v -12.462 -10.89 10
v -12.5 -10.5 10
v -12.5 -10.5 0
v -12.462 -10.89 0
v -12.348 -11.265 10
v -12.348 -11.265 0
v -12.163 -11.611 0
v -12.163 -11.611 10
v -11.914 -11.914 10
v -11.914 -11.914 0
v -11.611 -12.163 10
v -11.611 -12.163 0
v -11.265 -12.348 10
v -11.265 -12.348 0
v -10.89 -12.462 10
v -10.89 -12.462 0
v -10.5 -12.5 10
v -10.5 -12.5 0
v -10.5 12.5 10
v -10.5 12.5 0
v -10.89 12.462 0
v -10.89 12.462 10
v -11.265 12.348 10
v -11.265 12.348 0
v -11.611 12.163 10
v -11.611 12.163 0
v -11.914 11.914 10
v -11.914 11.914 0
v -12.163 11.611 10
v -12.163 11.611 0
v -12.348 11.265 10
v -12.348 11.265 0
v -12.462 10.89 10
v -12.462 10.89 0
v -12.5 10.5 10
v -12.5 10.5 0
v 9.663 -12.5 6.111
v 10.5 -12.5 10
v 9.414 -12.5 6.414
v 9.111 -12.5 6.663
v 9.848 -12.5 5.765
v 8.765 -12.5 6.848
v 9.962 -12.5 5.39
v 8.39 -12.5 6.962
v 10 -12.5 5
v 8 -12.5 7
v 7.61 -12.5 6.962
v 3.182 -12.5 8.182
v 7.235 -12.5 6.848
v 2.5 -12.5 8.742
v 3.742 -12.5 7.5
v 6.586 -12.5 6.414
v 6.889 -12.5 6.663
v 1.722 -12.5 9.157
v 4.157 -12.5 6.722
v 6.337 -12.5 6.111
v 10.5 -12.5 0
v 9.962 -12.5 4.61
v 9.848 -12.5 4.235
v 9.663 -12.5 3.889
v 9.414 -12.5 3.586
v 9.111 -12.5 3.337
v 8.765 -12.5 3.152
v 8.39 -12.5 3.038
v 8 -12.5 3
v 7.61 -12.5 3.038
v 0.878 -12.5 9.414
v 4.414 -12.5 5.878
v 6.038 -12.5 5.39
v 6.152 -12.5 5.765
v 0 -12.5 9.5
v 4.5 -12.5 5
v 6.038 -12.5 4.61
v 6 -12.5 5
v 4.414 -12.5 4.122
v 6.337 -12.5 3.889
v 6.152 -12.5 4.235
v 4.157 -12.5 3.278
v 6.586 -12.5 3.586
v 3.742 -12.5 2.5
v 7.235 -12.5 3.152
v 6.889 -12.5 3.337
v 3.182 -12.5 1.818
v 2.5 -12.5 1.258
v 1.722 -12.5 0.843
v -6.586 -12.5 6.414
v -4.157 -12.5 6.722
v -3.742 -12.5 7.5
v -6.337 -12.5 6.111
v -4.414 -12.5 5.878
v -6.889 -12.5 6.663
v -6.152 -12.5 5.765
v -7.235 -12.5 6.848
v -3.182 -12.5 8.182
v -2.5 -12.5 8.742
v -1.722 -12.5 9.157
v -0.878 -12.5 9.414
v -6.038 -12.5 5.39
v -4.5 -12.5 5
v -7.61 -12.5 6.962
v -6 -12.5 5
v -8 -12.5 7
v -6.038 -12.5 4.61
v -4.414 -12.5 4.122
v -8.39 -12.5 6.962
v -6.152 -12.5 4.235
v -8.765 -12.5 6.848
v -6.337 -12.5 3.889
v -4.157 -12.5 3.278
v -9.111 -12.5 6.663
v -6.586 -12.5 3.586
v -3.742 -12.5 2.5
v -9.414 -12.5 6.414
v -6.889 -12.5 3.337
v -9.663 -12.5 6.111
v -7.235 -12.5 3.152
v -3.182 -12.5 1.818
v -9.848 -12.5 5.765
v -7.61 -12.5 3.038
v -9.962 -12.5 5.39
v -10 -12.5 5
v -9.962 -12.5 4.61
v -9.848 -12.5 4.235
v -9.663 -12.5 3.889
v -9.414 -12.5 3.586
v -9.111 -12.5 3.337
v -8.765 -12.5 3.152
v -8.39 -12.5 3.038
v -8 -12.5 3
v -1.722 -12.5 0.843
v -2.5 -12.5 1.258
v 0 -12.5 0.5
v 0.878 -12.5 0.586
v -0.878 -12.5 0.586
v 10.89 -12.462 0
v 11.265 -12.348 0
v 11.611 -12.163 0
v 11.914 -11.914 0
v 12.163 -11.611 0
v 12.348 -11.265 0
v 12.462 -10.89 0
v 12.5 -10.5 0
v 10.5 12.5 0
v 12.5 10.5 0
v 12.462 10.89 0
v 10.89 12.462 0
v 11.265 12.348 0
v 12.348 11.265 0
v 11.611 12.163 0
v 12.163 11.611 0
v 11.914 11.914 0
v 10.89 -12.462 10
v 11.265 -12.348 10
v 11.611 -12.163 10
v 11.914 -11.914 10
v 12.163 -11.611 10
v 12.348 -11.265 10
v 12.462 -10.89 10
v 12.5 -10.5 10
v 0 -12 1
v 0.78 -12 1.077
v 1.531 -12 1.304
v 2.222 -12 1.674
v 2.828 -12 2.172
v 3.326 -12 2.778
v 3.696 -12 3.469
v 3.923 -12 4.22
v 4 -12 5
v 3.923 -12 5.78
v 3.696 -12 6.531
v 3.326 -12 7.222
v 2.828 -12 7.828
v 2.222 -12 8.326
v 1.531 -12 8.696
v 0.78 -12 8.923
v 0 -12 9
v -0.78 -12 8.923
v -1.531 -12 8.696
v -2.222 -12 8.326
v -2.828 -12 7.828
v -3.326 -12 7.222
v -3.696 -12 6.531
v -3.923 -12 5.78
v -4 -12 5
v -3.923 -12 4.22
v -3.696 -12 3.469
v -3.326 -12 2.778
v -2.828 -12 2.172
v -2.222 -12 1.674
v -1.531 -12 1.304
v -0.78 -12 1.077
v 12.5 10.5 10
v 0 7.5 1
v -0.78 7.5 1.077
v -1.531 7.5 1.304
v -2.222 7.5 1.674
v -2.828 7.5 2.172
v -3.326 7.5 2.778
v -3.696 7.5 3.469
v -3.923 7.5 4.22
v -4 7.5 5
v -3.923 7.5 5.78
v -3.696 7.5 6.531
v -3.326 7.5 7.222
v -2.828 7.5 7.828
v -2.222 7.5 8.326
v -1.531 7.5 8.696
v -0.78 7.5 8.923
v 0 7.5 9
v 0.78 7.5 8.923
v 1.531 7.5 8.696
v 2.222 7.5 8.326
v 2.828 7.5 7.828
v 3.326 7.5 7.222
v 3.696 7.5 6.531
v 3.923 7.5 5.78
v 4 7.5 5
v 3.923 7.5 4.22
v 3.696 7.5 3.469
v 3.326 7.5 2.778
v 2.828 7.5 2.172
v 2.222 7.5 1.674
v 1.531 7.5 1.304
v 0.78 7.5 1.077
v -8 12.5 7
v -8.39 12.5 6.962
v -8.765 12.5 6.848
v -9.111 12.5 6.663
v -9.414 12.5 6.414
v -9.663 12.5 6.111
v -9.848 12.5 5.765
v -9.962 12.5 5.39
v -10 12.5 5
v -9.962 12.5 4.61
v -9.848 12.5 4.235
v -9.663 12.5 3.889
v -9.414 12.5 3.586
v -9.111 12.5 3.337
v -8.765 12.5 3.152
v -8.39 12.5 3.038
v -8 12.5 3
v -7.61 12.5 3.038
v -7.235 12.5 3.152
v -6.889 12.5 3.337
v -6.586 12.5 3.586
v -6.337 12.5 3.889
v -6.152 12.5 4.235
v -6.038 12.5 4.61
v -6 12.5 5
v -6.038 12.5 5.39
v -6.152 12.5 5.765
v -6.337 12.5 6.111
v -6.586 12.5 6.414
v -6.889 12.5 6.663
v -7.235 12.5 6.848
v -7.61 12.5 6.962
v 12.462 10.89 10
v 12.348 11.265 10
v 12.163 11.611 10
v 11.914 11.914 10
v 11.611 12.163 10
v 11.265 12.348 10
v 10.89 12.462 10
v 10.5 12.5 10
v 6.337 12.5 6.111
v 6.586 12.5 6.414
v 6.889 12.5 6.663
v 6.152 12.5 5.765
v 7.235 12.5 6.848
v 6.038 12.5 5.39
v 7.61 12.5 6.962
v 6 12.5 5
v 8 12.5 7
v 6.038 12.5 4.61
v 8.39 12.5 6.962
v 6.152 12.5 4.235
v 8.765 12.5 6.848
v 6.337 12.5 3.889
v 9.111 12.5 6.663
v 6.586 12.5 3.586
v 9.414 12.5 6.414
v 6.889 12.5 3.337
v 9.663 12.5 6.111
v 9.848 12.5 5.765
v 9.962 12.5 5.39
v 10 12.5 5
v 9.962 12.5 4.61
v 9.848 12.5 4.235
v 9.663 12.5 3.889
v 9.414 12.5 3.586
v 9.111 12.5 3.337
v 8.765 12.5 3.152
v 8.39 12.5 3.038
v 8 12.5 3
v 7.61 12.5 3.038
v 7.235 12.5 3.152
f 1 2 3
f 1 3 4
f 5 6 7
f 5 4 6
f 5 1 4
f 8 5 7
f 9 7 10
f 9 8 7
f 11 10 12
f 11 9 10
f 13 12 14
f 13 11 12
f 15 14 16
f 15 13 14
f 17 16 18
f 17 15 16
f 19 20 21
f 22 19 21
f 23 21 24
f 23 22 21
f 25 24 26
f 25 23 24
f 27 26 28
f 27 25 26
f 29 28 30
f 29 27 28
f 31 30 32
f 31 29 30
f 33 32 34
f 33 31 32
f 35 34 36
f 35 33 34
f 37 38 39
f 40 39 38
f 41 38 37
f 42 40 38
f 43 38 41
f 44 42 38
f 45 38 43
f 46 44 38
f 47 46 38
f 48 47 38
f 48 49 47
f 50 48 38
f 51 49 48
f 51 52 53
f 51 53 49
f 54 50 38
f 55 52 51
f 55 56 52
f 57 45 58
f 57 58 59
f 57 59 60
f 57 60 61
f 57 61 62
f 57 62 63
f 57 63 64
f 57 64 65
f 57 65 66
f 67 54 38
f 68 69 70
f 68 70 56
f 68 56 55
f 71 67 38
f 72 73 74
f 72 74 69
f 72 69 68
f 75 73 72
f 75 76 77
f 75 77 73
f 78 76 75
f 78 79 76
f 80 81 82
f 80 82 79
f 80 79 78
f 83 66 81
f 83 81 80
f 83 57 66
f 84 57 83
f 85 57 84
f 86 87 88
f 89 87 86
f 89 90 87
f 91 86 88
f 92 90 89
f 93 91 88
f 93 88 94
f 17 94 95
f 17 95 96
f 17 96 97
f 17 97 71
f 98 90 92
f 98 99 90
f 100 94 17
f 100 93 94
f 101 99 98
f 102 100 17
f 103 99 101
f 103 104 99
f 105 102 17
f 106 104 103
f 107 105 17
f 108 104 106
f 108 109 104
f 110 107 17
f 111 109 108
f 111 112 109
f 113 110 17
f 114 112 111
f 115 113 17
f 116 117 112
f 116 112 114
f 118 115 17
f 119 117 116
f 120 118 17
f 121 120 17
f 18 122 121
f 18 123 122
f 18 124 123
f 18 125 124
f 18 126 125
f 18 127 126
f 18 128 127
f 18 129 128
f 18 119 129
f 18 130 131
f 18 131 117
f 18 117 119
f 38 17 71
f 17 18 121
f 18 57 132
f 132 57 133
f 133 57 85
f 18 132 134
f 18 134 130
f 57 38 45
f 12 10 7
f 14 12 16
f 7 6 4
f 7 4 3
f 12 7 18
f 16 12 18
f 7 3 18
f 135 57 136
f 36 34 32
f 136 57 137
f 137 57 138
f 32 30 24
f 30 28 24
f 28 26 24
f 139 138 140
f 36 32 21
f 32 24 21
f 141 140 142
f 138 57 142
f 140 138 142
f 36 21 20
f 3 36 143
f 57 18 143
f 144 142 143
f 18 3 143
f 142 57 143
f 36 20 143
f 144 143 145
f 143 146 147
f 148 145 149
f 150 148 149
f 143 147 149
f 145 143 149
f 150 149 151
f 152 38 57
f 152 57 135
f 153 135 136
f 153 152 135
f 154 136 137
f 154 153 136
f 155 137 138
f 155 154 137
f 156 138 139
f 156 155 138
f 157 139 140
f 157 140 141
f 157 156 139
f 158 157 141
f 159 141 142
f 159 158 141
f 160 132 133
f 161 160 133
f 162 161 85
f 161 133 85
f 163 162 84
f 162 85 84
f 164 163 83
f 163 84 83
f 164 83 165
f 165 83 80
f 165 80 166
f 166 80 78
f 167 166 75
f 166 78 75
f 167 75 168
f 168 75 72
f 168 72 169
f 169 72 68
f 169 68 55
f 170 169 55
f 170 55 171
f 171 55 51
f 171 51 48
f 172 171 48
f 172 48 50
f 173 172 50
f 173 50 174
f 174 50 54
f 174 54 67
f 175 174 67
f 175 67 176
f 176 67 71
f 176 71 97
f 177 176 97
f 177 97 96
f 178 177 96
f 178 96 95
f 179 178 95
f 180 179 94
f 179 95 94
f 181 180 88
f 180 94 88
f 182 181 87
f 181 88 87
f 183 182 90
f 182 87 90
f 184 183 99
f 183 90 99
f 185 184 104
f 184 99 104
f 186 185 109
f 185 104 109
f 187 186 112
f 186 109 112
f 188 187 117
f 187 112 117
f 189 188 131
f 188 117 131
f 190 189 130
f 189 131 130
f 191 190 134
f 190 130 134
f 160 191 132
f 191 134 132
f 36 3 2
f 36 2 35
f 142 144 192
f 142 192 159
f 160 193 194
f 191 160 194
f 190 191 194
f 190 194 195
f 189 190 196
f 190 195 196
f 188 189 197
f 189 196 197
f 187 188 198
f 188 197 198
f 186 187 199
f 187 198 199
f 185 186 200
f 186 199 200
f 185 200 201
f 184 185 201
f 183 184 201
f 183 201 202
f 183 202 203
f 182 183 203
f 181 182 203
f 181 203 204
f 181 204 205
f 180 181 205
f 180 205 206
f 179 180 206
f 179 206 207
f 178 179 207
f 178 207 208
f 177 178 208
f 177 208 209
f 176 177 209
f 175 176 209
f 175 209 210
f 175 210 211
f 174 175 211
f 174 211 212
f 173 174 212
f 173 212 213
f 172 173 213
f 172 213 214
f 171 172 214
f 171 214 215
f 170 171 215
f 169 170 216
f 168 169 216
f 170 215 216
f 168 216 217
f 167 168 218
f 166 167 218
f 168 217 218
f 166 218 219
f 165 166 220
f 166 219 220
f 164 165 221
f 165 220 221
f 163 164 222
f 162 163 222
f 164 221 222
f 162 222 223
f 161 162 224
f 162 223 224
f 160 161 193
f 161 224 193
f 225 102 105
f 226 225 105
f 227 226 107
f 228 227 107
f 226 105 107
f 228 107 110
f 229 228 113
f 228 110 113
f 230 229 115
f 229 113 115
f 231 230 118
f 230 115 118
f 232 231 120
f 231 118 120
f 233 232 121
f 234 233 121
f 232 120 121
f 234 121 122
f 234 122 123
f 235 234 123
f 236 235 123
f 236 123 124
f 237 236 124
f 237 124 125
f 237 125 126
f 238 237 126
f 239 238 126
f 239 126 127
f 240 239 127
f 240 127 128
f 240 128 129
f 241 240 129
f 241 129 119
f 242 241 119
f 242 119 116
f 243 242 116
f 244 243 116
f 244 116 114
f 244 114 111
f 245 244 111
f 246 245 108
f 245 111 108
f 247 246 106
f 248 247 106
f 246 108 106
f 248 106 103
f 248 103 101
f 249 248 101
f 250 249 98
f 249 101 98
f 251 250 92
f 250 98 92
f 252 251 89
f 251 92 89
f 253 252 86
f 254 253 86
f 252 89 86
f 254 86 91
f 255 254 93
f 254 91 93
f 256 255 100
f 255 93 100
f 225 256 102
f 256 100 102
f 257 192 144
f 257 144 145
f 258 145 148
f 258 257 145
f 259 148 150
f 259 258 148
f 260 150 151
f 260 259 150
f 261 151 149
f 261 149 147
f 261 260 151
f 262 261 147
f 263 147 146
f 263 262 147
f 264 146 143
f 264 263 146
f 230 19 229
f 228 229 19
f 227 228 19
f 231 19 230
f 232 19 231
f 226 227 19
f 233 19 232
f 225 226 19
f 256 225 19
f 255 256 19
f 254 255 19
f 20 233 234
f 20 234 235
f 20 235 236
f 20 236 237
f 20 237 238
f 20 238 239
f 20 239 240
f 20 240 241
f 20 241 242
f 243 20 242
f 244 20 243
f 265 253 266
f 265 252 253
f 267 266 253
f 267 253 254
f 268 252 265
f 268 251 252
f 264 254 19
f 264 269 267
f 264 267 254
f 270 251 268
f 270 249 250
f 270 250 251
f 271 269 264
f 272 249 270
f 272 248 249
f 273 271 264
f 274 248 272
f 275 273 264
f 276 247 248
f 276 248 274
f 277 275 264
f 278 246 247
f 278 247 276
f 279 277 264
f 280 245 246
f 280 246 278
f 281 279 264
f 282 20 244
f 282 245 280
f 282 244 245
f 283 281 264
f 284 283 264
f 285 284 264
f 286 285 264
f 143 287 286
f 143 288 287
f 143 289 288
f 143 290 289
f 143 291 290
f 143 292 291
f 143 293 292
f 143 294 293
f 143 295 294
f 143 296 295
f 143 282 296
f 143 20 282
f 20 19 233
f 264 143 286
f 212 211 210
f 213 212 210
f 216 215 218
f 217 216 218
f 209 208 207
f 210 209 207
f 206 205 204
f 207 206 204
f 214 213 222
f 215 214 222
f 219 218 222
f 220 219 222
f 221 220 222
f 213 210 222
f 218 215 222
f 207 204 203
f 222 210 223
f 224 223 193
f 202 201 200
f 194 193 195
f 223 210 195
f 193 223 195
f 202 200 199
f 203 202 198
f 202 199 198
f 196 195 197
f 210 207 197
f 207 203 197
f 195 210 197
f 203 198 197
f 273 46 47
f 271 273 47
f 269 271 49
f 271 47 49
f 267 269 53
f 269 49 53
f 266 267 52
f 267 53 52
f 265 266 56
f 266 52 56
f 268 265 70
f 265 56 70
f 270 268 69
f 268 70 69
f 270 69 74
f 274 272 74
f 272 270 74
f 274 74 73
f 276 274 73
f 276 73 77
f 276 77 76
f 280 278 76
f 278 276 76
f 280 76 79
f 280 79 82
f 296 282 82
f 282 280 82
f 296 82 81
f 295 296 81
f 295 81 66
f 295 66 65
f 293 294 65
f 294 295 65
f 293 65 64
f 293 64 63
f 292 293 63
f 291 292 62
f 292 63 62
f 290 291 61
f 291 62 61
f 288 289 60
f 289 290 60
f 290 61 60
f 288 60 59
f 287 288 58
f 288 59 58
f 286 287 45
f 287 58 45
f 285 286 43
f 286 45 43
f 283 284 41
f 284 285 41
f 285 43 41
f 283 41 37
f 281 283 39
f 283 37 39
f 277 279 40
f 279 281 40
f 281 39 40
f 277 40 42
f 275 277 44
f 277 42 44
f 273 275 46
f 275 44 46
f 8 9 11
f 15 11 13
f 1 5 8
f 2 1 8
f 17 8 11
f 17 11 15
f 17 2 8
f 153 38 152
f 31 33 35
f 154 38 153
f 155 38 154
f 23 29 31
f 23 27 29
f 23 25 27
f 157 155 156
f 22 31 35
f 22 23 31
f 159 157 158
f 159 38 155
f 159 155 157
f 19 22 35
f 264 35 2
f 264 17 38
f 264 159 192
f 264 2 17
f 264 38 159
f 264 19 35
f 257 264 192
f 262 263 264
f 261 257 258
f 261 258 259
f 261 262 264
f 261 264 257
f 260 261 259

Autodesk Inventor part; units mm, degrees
ref_plane "YZ Plane" through (0, 0, 0) normal (1, 0, 0) x (0, 1, 0)
ref_plane "XZ Plane" through (0, 0, 0) normal (0, 1, 0) x (-1, 0, 0)
ref_plane "XY Plane" through (0, 0, 0) normal (0, 0, 1) x (1, 0, 0)
sketch "Sketch1" plane through (0, 0, 0) normal (0, 0, 1) x (1, 0, 0)
  line L0 (-12.5, 12.5) -> (12.5, 12.5)
  line L1 (12.5, 12.5) -> (12.5, -12.5)
  line L2 (12.5, -12.5) -> (-12.5, -12.5)
  line L3 (-12.5, -12.5) -> (-12.5, 12.5)
  point P0 (0, 0)
  dimension "d2" = 25
  dimension "d3" = 12.5
  dimension "d4" = 25
  dimension "d5" = 12.5
extrude "Extrusion1" add sketch "Sketch1" along normal blind 10
sketch "Sketch2" plane through (-12.5, 12.5, 0) normal (0, 1, 0) x (1, 0, 0)
  line L0 (25, -10) -> (0, -10) projected
  line L1 (25, 0) -> (0, 0) projected
  line L2 (0, 0) -> (0, -10) projected
  point P0 (12.5, 0)
  point P1 (4.5, -5)
  dimension "d8" = 10
  dimension "d9" = 5
  dimension "d18" = 8
hole "Hole1" at (-8, 12.5, 5) direction (0, -1, 0) diameter 4 depth 25
mirror "Mirror1" about plane through (0, 0, 0) normal (1, 0, 0) of "Hole1"
sketch "Sketch3" plane through (-12.5, -12.5, 0) normal (0, -1, 0) x (1, 0, 0)
  line L0 (0, 0) -> (25, 0) projected
  line L1 (0, 10) -> (25, 10) projected
  line L2 (0, 0) -> (0, 10) projected
  line L3 (25, 0) -> (25, 10) projected
  point P0 (12.5, 0)
  point P1 (12.5, 5)
  dimension "d19" = 10
  dimension "d20" = 25
  dimension "d21" = 12.5
  dimension "d22" = 5
hole "Hole2" at (0, -12.5, 5) direction (0, 1, 0) diameter 8 depth 20
chamfer "Chamfer1" distance 0.5 angle 45 1 edges at (0, -12.5, 9)
fillet "Fillet1" radius 2 4 edges at (-12.5, -12.5, 5) (-12.5, 12.5, 5) (12.5, 12.5, 5) (12.5, -12.5, 5)
equation "\"d3\" = 0.5 * d2"
equation "\"d5\" = 0.5 * d4"
equation "\"d9\" = 0.5 * d8"
equation "\"d21\" = 0.5 * d20"
equation "\"d22\" = 0.5 * d19"
properties part number "pendulum_mass" material "ABS Plastic"
